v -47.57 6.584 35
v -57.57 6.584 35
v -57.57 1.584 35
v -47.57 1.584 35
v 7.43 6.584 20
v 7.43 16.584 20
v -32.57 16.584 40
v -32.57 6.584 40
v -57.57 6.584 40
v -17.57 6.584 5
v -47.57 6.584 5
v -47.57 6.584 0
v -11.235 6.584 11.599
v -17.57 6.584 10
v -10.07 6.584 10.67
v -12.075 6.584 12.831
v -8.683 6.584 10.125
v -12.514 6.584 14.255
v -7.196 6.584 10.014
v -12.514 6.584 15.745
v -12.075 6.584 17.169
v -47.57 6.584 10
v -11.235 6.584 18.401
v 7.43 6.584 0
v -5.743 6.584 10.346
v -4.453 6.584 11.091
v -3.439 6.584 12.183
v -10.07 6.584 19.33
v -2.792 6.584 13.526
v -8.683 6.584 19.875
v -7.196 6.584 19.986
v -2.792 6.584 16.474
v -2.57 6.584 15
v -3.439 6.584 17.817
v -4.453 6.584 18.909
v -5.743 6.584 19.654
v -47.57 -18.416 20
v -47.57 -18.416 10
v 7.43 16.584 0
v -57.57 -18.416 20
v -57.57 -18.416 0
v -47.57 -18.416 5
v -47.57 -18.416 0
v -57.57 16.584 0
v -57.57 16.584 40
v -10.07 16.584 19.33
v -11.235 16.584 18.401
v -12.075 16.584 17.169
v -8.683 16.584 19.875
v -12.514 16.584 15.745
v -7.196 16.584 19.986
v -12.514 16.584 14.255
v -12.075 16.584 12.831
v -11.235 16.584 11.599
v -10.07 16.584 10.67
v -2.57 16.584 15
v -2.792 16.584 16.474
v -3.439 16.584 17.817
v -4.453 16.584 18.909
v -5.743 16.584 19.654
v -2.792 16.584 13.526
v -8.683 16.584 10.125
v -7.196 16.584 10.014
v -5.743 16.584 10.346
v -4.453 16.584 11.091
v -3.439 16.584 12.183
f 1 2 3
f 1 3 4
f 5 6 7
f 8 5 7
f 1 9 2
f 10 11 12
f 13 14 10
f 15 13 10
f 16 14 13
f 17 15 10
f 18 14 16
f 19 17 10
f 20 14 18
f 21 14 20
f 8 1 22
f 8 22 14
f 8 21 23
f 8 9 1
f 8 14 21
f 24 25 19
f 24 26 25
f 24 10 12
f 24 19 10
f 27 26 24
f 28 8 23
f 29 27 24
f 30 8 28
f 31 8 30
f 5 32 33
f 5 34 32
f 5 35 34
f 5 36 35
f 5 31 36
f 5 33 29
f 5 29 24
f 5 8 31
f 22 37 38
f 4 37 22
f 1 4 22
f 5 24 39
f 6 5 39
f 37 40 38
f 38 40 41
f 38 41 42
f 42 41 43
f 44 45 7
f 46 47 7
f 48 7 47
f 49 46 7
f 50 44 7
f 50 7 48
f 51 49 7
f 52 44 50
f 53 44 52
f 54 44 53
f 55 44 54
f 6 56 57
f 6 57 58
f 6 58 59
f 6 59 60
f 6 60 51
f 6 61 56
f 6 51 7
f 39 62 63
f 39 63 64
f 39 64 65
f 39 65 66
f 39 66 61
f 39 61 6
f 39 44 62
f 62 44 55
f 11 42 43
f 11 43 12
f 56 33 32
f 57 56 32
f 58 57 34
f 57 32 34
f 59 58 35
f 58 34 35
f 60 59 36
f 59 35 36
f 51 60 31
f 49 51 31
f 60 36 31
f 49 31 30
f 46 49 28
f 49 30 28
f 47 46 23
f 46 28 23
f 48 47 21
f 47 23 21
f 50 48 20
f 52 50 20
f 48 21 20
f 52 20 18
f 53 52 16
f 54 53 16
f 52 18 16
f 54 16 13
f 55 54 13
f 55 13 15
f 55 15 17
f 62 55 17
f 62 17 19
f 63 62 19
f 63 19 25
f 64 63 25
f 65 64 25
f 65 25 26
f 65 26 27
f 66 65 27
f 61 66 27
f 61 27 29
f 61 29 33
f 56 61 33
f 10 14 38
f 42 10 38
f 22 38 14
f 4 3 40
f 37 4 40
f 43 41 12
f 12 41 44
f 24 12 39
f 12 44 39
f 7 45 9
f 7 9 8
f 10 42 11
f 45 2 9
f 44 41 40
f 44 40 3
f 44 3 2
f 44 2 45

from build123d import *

# Parameters (mm, degrees)
F0_W      = 65
F0_H      = 35
F1_DEPTH  = 40
F2_W      = 10
F2_H      = 5
F3_DEPTH  = 5
F5_DEPTH  = 65
F6_DEPTH  = 65
F7_W      = 25
F7_H      = 5
F8_DEPTH  = 55
F10_DEPTH = 25
F12_DEPTH = 25
F13_R     = 5
F14_DEPTH = 25


with BuildPart() as f1:
    # F0 (on Top) → F1 (new body)
    with BuildSketch(Plane.XY):
        with Locations((-25.0700588524, -0.9162277728)):
            Rectangle(F0_W, F0_H)
    extrude(amount=F1_DEPTH)

    # F2 (on face) → F3 (cut)
    with BuildSketch(Plane.XY.offset(40)):
        with Locations((-52.5700588524, 4.0837722272)):
            Rectangle(F2_W, F2_H)
    extrude(amount=-F3_DEPTH, mode=Mode.SUBTRACT)

    # F4 (on face) → F5 (cut)
    with BuildSketch(Plane(origin=(-57.5700588524, 0, 0), x_dir=(0, -1, 0), z_dir=(-1, 0, 0))):
        Polygon((-1.5837722272, 40), (-1.5837722272, 35), (18.4162277728, 20), (18.4162277728, 40), align=None)
    extrude(amount=-F5_DEPTH, mode=Mode.SUBTRACT)

    # F6 (cut): a face of the model
    f6_faces = [f1.faces().sort_by_distance(p)[0] for p in [
        (-47.5700588524, 4.0837722272, 37.5),
    ]]
    extrude(f6_faces, amount=-F6_DEPTH, mode=Mode.SUBTRACT)

    # F7 (on face) → F8 (cut)
    with BuildSketch(Plane.YZ.offset(7.4299411476)):
        Polygon((6.5837722272, 10), (6.5837722272, 35), (1.5837722272, 35), (-18.4162277728, 20), (-18.4162277728, 10), align=None)
        with Locations((-5.9162277728, 2.5)):
            Rectangle(F7_W, F7_H)
    extrude(amount=-F8_DEPTH, mode=Mode.SUBTRACT)

    # F9 (on face) → F10 (cut)
    with BuildSketch(Plane(origin=(0, 16.5837722272, 0), x_dir=(-1, 0, 0), z_dir=(0, 1, 0))):
        Polygon((-7.4299411476, 20), (32.5700588524, 40), (-7.4299411476, 40), align=None)
    extrude(amount=-F10_DEPTH, mode=Mode.SUBTRACT)

    # F11 (on face) → F12 (cut)
    with BuildSketch(Plane.XY.offset(10)):
        Polygon((-17.5700588524, 6.5837722272), (-47.5700588524, -18.4162277728), (7.4299411476, -18.4162277728), (7.4299411476, 6.5837722272), align=None)
    extrude(amount=-F12_DEPTH, mode=Mode.SUBTRACT)

    # F13 (on face) → F14 (cut)
    with BuildSketch(Plane.XZ.offset(-6.5837722272)):
        with Locations((-7.5700588524, 15)):
            Circle(F13_R)
    extrude(amount=-F14_DEPTH, mode=Mode.SUBTRACT)


solid = f1.part
